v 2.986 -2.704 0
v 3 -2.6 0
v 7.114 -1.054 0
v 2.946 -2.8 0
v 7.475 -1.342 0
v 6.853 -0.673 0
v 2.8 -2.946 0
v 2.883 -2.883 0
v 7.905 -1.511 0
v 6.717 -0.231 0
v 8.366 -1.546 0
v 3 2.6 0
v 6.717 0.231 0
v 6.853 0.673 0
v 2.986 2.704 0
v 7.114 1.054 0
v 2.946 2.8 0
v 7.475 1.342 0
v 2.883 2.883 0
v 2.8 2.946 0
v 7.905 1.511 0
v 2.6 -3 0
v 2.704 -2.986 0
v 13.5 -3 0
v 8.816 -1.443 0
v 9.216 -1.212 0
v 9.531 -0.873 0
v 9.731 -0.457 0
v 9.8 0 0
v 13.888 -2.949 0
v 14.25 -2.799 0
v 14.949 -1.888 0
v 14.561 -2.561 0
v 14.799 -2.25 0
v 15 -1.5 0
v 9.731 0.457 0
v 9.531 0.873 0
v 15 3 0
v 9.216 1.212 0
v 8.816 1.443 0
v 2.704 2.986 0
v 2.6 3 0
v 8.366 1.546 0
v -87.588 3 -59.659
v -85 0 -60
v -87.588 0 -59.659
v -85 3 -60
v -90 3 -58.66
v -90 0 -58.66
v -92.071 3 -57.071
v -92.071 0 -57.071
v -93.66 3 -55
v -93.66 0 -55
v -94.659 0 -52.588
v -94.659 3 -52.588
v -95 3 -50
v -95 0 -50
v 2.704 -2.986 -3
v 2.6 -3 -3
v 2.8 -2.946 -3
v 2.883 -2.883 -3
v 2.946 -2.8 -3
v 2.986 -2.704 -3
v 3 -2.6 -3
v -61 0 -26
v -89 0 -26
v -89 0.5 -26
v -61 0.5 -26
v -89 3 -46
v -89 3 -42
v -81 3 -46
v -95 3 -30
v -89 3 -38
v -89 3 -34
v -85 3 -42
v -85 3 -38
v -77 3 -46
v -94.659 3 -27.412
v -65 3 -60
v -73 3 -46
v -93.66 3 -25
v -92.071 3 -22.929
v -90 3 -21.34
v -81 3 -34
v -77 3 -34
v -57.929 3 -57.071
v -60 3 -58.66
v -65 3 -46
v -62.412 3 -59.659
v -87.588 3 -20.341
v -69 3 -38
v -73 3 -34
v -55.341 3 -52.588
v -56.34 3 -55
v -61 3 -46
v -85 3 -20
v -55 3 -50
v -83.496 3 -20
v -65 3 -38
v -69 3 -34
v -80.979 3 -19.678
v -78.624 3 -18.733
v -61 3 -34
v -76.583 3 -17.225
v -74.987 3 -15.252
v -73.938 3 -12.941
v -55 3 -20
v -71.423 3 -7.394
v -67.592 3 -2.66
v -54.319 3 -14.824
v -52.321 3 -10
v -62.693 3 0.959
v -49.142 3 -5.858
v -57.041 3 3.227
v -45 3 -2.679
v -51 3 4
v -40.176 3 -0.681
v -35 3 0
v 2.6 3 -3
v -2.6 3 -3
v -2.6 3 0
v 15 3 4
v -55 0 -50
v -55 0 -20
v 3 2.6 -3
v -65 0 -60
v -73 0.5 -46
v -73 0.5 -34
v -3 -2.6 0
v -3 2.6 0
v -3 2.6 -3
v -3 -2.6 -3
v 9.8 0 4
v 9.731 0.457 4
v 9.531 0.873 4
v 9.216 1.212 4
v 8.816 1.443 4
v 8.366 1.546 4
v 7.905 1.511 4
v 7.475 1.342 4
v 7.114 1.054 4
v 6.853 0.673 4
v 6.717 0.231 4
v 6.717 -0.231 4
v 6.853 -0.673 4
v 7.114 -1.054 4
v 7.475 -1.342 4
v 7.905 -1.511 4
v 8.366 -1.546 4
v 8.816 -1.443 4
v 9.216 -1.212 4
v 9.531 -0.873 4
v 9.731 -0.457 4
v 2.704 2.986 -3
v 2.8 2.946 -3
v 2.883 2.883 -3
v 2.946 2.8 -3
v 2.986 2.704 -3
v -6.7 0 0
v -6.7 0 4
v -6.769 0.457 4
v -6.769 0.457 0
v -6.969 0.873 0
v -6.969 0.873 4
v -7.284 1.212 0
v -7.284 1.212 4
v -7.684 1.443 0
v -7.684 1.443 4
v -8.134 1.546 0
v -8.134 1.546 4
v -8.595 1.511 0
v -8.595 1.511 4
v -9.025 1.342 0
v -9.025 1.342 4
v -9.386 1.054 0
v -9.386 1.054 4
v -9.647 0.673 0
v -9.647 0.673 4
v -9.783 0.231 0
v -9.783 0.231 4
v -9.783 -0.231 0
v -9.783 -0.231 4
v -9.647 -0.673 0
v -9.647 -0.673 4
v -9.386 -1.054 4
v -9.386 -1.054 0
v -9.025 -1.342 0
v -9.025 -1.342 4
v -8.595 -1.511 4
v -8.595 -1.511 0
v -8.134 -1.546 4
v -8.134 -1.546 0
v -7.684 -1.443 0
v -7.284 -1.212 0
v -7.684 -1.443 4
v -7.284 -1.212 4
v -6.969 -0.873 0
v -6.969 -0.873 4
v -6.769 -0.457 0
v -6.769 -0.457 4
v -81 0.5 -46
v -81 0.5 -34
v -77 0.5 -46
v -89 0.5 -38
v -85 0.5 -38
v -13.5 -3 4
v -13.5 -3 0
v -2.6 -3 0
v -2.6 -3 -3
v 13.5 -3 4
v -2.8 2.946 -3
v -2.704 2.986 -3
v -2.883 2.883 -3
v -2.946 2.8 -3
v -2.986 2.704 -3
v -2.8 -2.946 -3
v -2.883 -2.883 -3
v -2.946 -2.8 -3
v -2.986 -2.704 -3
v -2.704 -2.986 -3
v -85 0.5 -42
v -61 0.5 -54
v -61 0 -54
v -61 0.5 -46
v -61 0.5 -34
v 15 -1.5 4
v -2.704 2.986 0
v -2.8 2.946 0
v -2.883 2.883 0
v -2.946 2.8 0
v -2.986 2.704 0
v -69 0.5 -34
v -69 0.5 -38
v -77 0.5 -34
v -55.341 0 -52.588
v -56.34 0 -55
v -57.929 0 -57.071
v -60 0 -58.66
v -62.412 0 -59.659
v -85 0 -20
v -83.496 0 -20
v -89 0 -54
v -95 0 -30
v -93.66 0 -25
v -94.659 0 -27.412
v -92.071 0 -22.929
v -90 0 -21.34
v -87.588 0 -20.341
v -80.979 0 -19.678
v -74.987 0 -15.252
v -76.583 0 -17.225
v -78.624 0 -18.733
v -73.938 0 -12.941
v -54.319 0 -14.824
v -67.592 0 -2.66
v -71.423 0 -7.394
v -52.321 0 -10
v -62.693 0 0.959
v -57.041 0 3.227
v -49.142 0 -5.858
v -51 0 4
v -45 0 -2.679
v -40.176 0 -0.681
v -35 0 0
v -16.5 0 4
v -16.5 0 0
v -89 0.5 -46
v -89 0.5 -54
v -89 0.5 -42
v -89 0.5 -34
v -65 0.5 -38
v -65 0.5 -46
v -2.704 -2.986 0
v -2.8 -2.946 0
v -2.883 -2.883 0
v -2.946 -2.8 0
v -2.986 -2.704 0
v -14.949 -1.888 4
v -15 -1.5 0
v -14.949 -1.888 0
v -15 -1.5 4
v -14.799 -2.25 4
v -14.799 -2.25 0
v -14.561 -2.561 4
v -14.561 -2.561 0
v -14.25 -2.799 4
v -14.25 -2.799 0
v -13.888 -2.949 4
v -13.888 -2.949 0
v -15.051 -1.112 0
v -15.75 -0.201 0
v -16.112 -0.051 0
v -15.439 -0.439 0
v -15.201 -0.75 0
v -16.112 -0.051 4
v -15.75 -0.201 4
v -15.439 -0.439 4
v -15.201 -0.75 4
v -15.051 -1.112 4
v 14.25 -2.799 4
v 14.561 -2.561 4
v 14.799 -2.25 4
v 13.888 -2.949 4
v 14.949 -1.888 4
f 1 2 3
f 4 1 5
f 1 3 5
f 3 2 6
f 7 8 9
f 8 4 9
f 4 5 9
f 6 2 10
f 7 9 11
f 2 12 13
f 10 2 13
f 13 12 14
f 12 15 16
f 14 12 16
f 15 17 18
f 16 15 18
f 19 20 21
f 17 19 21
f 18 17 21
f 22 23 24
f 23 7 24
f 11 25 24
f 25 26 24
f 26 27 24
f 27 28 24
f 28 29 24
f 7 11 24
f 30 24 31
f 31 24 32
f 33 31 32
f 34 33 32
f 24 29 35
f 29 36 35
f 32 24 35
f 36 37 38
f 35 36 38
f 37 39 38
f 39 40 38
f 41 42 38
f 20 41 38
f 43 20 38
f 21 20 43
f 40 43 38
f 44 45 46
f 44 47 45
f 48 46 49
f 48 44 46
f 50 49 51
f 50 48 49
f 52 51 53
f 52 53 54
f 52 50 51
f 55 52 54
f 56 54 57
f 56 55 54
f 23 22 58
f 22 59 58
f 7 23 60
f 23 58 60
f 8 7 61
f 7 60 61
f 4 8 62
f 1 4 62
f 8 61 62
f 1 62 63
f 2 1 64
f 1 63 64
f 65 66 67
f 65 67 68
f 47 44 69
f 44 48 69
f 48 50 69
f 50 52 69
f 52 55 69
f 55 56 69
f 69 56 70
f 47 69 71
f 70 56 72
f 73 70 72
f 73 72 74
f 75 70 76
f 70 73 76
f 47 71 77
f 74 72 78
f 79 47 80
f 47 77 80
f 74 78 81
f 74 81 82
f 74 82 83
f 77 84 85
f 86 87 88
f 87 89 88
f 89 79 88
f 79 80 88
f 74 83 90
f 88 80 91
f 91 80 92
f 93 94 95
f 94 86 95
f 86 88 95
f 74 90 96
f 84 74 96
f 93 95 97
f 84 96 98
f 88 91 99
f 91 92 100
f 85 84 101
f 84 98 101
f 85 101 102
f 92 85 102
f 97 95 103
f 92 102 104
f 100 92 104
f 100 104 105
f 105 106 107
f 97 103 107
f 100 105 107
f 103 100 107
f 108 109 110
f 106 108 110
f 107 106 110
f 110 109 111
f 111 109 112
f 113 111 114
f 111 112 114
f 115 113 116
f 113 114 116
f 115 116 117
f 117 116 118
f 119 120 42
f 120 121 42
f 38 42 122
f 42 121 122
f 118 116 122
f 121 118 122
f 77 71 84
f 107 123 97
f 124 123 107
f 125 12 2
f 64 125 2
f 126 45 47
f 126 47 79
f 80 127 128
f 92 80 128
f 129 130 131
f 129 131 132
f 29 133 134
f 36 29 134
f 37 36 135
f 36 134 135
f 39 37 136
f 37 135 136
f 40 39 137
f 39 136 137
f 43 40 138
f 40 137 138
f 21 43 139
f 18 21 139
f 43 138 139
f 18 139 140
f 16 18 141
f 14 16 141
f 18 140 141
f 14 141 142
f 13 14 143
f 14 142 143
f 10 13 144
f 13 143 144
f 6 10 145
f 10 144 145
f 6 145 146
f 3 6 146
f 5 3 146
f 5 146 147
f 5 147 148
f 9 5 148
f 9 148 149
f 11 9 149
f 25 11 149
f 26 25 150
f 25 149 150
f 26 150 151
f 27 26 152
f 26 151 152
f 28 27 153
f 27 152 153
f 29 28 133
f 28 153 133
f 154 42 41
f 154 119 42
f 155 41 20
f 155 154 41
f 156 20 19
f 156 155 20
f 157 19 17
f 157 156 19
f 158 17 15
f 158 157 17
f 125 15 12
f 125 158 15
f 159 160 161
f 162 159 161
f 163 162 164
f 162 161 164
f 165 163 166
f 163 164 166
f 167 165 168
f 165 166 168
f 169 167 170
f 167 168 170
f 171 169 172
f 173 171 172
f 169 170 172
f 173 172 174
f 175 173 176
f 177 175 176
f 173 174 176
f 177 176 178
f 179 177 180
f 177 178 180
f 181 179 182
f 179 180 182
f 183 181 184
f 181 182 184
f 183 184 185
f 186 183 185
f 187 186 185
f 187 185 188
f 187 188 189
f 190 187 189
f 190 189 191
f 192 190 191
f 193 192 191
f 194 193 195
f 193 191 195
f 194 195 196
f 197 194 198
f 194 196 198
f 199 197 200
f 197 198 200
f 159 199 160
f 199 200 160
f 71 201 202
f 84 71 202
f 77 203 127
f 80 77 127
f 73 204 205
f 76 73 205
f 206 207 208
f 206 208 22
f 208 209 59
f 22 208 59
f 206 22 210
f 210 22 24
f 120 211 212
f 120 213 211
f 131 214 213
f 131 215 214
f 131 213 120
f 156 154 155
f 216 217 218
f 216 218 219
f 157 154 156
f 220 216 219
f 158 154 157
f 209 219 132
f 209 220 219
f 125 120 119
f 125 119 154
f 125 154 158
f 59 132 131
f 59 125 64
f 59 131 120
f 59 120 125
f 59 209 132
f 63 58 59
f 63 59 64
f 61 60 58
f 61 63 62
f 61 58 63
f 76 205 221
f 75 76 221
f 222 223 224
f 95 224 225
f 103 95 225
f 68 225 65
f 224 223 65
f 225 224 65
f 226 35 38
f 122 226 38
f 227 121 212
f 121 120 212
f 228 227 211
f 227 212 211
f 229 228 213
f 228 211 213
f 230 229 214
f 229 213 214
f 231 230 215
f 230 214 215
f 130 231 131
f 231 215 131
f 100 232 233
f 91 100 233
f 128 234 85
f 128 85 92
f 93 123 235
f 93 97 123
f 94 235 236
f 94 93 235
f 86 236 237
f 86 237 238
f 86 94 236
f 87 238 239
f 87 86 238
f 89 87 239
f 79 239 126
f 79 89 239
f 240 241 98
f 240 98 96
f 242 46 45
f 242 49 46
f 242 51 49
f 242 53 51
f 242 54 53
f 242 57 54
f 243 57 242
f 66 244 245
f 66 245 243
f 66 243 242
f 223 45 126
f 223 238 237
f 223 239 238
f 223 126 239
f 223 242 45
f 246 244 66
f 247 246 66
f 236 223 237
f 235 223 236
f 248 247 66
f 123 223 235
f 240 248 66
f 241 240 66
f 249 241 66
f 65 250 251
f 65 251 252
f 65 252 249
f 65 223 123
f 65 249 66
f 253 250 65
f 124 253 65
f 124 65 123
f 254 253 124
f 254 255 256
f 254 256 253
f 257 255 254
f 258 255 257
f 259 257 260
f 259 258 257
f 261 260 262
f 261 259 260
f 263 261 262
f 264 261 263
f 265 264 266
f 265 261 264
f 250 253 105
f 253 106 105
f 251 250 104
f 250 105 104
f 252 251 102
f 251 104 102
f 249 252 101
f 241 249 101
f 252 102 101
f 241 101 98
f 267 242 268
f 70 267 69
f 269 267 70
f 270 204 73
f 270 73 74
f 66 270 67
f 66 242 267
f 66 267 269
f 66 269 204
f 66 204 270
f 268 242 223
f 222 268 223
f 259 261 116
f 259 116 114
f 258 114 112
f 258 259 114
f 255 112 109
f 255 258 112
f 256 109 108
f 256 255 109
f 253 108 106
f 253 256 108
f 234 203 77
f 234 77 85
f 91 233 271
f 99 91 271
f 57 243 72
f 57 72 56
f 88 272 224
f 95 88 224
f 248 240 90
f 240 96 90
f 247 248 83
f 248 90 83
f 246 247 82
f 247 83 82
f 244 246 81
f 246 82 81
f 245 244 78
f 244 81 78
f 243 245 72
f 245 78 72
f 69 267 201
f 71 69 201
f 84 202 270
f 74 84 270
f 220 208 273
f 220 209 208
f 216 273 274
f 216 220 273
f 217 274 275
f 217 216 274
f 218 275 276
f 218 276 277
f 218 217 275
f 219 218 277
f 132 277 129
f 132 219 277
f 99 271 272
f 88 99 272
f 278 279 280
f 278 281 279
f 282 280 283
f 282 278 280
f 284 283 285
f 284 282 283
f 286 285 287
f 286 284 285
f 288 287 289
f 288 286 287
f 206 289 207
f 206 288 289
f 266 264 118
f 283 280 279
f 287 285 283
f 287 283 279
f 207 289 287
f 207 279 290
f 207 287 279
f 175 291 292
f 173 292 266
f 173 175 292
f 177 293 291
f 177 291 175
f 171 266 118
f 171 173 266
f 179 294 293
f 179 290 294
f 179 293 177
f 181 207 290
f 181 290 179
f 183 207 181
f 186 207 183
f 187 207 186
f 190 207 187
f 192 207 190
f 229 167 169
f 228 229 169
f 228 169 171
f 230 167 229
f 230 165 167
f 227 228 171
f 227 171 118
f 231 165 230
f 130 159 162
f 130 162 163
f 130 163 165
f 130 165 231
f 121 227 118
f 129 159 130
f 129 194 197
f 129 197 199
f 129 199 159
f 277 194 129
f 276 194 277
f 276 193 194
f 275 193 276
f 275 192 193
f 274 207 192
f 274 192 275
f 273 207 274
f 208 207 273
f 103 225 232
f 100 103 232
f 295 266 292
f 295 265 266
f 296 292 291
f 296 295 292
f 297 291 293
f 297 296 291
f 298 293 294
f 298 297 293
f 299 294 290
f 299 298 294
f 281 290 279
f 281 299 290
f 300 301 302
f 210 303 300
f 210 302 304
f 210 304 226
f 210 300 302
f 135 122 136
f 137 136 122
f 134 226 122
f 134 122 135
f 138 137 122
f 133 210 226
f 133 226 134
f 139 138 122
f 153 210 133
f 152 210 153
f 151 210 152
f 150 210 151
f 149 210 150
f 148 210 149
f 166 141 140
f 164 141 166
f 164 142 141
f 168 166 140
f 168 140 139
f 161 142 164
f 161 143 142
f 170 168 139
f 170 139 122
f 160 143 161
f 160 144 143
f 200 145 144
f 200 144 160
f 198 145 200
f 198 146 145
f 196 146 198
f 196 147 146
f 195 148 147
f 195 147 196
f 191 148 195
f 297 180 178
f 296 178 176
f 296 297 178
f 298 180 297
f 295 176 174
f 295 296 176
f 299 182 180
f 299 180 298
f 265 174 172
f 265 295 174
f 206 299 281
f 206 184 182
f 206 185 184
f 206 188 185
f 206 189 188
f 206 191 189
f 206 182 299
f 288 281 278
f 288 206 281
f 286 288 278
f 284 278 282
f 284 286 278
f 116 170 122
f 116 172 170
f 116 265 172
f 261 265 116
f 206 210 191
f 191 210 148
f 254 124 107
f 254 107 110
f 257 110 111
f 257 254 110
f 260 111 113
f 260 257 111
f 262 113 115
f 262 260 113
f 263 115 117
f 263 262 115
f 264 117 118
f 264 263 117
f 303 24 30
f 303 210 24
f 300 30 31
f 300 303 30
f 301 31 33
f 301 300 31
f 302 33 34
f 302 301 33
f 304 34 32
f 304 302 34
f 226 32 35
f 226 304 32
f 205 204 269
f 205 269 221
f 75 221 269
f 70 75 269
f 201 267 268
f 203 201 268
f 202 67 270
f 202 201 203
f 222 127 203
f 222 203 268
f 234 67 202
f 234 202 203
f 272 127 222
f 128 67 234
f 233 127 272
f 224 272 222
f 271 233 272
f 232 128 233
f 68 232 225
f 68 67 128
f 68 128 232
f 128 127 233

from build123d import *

# Parameters (mm, degrees)
F0_W      = 30
F0_H      = 6
F1_DEPTH  = 4
F2_W      = 6
F2_H      = 6
F3_DEPTH  = 3
F4_R      = 1.55
F5_DEPTH  = 4
F7_DEPTH  = 3
F8_W      = 28
F8_H      = 28
F9_DEPTH  = 0.5
F11_R     = 1.49999
F12_R     = 10
F13_R     = 0.4
F10_W     = 4
F10_H     = 12
F14_DEPTH = 2.5


# Not quite as in the source:
# - a fillet or chamfer is up to 0.001 mm smaller than in the source, because OpenCascade refuses the exact size


with BuildPart() as f1:
    # F0 (on Top) → F1 (new body)
    with BuildSketch(Plane.XY):
        Rectangle(F0_W, F0_H)
    extrude(amount=F1_DEPTH)

    # F2 (on face) → F3 (join)
    with BuildSketch(Plane(origin=(0, 0, 0), x_dir=(1, 0, 0), z_dir=(0, 0, -1))):
        Rectangle(F2_W, F2_H)
    extrude(amount=F3_DEPTH)

    # F4 (on face) → F5 (cut, through all)
    with BuildSketch(Plane.XY.offset(4)):
        with Locations((-8.25, 0)):
            Circle(F4_R)
        with Locations((8.25, 0)):
            Circle(F4_R)
    extrude(amount=-F5_DEPTH, mode=Mode.SUBTRACT)

    # F6 (on Front) → F7 (join, through all)
    with BuildSketch(Plane.XZ):
        with BuildLine():
            Line((-15, 0), (-15, 4))
            Line((-15, 4), (-51, 4))
            ThreePointArc((-51, 4), (-67.9705627485, -3.0294372515), (-75, -20))
            Line((-75, -20), (-95, -20))
            Line((-95, -20), (-95, -60))
            Line((-95, -60), (-55, -60))
            Line((-55, -60), (-55, -20))
            ThreePointArc((-55, -20), (-49.1421356237, -5.8578643763), (-35, 0))
            Line((-35, 0), (-15, 0))
        make_face()
    extrude(amount=-F7_DEPTH)

    # F8 (on face) → F9 (cut)
    with BuildSketch(Plane.XZ):
        with Locations((-75, -40)):
            Rectangle(F8_W, F8_H)
    extrude(amount=-F9_DEPTH, mode=Mode.SUBTRACT)

    # F11 (radius 1.5 in the source; OpenCascade refuses exactly that, so slightly less here)
    f11_edges = [f1.edges().sort_by_distance(p)[0] for p in [
        (-15, 0, 2),
        (-15, -3, 2),
        (15, -3, 2),
    ]]
    fillet(f11_edges, radius=F11_R)

    # F12
    f12_edges = [f1.edges().sort_by_distance(p)[0] for p in [
        (-55, 1.5, -60),
        (-95, 1.5, -60),
        (-95, 1.5, -20),
        (-75, 1.5, -20),
    ]]
    fillet(f12_edges, radius=F12_R)

    # F13
    f13_edges = [f1.edges().sort_by_distance(p)[0] for p in [
        (3, -3, -1.5),
        (3, 3, -1.5),
        (-3, 3, -1.5),
        (-3, -3, -1.5),
    ]]
    fillet(f13_edges, radius=F13_R)

    # F10 (on face) → F14 (cut, through all)
    with BuildSketch(Plane.XZ.offset(-0.5)):
        Polygon((-81, -34), (-89, -34), (-89, -38), (-85, -38), (-85, -42), (-89, -42), (-89, -46), (-81, -46), align=None)
        with Locations((-75, -40)):
            Rectangle(F10_W, F10_H)
        Polygon((-61, -46), (-61, -34), (-69, -34), (-69, -38), (-65, -38), (-65, -46), align=None)
    extrude(amount=-F14_DEPTH, mode=Mode.SUBTRACT)


solid = f1.part
